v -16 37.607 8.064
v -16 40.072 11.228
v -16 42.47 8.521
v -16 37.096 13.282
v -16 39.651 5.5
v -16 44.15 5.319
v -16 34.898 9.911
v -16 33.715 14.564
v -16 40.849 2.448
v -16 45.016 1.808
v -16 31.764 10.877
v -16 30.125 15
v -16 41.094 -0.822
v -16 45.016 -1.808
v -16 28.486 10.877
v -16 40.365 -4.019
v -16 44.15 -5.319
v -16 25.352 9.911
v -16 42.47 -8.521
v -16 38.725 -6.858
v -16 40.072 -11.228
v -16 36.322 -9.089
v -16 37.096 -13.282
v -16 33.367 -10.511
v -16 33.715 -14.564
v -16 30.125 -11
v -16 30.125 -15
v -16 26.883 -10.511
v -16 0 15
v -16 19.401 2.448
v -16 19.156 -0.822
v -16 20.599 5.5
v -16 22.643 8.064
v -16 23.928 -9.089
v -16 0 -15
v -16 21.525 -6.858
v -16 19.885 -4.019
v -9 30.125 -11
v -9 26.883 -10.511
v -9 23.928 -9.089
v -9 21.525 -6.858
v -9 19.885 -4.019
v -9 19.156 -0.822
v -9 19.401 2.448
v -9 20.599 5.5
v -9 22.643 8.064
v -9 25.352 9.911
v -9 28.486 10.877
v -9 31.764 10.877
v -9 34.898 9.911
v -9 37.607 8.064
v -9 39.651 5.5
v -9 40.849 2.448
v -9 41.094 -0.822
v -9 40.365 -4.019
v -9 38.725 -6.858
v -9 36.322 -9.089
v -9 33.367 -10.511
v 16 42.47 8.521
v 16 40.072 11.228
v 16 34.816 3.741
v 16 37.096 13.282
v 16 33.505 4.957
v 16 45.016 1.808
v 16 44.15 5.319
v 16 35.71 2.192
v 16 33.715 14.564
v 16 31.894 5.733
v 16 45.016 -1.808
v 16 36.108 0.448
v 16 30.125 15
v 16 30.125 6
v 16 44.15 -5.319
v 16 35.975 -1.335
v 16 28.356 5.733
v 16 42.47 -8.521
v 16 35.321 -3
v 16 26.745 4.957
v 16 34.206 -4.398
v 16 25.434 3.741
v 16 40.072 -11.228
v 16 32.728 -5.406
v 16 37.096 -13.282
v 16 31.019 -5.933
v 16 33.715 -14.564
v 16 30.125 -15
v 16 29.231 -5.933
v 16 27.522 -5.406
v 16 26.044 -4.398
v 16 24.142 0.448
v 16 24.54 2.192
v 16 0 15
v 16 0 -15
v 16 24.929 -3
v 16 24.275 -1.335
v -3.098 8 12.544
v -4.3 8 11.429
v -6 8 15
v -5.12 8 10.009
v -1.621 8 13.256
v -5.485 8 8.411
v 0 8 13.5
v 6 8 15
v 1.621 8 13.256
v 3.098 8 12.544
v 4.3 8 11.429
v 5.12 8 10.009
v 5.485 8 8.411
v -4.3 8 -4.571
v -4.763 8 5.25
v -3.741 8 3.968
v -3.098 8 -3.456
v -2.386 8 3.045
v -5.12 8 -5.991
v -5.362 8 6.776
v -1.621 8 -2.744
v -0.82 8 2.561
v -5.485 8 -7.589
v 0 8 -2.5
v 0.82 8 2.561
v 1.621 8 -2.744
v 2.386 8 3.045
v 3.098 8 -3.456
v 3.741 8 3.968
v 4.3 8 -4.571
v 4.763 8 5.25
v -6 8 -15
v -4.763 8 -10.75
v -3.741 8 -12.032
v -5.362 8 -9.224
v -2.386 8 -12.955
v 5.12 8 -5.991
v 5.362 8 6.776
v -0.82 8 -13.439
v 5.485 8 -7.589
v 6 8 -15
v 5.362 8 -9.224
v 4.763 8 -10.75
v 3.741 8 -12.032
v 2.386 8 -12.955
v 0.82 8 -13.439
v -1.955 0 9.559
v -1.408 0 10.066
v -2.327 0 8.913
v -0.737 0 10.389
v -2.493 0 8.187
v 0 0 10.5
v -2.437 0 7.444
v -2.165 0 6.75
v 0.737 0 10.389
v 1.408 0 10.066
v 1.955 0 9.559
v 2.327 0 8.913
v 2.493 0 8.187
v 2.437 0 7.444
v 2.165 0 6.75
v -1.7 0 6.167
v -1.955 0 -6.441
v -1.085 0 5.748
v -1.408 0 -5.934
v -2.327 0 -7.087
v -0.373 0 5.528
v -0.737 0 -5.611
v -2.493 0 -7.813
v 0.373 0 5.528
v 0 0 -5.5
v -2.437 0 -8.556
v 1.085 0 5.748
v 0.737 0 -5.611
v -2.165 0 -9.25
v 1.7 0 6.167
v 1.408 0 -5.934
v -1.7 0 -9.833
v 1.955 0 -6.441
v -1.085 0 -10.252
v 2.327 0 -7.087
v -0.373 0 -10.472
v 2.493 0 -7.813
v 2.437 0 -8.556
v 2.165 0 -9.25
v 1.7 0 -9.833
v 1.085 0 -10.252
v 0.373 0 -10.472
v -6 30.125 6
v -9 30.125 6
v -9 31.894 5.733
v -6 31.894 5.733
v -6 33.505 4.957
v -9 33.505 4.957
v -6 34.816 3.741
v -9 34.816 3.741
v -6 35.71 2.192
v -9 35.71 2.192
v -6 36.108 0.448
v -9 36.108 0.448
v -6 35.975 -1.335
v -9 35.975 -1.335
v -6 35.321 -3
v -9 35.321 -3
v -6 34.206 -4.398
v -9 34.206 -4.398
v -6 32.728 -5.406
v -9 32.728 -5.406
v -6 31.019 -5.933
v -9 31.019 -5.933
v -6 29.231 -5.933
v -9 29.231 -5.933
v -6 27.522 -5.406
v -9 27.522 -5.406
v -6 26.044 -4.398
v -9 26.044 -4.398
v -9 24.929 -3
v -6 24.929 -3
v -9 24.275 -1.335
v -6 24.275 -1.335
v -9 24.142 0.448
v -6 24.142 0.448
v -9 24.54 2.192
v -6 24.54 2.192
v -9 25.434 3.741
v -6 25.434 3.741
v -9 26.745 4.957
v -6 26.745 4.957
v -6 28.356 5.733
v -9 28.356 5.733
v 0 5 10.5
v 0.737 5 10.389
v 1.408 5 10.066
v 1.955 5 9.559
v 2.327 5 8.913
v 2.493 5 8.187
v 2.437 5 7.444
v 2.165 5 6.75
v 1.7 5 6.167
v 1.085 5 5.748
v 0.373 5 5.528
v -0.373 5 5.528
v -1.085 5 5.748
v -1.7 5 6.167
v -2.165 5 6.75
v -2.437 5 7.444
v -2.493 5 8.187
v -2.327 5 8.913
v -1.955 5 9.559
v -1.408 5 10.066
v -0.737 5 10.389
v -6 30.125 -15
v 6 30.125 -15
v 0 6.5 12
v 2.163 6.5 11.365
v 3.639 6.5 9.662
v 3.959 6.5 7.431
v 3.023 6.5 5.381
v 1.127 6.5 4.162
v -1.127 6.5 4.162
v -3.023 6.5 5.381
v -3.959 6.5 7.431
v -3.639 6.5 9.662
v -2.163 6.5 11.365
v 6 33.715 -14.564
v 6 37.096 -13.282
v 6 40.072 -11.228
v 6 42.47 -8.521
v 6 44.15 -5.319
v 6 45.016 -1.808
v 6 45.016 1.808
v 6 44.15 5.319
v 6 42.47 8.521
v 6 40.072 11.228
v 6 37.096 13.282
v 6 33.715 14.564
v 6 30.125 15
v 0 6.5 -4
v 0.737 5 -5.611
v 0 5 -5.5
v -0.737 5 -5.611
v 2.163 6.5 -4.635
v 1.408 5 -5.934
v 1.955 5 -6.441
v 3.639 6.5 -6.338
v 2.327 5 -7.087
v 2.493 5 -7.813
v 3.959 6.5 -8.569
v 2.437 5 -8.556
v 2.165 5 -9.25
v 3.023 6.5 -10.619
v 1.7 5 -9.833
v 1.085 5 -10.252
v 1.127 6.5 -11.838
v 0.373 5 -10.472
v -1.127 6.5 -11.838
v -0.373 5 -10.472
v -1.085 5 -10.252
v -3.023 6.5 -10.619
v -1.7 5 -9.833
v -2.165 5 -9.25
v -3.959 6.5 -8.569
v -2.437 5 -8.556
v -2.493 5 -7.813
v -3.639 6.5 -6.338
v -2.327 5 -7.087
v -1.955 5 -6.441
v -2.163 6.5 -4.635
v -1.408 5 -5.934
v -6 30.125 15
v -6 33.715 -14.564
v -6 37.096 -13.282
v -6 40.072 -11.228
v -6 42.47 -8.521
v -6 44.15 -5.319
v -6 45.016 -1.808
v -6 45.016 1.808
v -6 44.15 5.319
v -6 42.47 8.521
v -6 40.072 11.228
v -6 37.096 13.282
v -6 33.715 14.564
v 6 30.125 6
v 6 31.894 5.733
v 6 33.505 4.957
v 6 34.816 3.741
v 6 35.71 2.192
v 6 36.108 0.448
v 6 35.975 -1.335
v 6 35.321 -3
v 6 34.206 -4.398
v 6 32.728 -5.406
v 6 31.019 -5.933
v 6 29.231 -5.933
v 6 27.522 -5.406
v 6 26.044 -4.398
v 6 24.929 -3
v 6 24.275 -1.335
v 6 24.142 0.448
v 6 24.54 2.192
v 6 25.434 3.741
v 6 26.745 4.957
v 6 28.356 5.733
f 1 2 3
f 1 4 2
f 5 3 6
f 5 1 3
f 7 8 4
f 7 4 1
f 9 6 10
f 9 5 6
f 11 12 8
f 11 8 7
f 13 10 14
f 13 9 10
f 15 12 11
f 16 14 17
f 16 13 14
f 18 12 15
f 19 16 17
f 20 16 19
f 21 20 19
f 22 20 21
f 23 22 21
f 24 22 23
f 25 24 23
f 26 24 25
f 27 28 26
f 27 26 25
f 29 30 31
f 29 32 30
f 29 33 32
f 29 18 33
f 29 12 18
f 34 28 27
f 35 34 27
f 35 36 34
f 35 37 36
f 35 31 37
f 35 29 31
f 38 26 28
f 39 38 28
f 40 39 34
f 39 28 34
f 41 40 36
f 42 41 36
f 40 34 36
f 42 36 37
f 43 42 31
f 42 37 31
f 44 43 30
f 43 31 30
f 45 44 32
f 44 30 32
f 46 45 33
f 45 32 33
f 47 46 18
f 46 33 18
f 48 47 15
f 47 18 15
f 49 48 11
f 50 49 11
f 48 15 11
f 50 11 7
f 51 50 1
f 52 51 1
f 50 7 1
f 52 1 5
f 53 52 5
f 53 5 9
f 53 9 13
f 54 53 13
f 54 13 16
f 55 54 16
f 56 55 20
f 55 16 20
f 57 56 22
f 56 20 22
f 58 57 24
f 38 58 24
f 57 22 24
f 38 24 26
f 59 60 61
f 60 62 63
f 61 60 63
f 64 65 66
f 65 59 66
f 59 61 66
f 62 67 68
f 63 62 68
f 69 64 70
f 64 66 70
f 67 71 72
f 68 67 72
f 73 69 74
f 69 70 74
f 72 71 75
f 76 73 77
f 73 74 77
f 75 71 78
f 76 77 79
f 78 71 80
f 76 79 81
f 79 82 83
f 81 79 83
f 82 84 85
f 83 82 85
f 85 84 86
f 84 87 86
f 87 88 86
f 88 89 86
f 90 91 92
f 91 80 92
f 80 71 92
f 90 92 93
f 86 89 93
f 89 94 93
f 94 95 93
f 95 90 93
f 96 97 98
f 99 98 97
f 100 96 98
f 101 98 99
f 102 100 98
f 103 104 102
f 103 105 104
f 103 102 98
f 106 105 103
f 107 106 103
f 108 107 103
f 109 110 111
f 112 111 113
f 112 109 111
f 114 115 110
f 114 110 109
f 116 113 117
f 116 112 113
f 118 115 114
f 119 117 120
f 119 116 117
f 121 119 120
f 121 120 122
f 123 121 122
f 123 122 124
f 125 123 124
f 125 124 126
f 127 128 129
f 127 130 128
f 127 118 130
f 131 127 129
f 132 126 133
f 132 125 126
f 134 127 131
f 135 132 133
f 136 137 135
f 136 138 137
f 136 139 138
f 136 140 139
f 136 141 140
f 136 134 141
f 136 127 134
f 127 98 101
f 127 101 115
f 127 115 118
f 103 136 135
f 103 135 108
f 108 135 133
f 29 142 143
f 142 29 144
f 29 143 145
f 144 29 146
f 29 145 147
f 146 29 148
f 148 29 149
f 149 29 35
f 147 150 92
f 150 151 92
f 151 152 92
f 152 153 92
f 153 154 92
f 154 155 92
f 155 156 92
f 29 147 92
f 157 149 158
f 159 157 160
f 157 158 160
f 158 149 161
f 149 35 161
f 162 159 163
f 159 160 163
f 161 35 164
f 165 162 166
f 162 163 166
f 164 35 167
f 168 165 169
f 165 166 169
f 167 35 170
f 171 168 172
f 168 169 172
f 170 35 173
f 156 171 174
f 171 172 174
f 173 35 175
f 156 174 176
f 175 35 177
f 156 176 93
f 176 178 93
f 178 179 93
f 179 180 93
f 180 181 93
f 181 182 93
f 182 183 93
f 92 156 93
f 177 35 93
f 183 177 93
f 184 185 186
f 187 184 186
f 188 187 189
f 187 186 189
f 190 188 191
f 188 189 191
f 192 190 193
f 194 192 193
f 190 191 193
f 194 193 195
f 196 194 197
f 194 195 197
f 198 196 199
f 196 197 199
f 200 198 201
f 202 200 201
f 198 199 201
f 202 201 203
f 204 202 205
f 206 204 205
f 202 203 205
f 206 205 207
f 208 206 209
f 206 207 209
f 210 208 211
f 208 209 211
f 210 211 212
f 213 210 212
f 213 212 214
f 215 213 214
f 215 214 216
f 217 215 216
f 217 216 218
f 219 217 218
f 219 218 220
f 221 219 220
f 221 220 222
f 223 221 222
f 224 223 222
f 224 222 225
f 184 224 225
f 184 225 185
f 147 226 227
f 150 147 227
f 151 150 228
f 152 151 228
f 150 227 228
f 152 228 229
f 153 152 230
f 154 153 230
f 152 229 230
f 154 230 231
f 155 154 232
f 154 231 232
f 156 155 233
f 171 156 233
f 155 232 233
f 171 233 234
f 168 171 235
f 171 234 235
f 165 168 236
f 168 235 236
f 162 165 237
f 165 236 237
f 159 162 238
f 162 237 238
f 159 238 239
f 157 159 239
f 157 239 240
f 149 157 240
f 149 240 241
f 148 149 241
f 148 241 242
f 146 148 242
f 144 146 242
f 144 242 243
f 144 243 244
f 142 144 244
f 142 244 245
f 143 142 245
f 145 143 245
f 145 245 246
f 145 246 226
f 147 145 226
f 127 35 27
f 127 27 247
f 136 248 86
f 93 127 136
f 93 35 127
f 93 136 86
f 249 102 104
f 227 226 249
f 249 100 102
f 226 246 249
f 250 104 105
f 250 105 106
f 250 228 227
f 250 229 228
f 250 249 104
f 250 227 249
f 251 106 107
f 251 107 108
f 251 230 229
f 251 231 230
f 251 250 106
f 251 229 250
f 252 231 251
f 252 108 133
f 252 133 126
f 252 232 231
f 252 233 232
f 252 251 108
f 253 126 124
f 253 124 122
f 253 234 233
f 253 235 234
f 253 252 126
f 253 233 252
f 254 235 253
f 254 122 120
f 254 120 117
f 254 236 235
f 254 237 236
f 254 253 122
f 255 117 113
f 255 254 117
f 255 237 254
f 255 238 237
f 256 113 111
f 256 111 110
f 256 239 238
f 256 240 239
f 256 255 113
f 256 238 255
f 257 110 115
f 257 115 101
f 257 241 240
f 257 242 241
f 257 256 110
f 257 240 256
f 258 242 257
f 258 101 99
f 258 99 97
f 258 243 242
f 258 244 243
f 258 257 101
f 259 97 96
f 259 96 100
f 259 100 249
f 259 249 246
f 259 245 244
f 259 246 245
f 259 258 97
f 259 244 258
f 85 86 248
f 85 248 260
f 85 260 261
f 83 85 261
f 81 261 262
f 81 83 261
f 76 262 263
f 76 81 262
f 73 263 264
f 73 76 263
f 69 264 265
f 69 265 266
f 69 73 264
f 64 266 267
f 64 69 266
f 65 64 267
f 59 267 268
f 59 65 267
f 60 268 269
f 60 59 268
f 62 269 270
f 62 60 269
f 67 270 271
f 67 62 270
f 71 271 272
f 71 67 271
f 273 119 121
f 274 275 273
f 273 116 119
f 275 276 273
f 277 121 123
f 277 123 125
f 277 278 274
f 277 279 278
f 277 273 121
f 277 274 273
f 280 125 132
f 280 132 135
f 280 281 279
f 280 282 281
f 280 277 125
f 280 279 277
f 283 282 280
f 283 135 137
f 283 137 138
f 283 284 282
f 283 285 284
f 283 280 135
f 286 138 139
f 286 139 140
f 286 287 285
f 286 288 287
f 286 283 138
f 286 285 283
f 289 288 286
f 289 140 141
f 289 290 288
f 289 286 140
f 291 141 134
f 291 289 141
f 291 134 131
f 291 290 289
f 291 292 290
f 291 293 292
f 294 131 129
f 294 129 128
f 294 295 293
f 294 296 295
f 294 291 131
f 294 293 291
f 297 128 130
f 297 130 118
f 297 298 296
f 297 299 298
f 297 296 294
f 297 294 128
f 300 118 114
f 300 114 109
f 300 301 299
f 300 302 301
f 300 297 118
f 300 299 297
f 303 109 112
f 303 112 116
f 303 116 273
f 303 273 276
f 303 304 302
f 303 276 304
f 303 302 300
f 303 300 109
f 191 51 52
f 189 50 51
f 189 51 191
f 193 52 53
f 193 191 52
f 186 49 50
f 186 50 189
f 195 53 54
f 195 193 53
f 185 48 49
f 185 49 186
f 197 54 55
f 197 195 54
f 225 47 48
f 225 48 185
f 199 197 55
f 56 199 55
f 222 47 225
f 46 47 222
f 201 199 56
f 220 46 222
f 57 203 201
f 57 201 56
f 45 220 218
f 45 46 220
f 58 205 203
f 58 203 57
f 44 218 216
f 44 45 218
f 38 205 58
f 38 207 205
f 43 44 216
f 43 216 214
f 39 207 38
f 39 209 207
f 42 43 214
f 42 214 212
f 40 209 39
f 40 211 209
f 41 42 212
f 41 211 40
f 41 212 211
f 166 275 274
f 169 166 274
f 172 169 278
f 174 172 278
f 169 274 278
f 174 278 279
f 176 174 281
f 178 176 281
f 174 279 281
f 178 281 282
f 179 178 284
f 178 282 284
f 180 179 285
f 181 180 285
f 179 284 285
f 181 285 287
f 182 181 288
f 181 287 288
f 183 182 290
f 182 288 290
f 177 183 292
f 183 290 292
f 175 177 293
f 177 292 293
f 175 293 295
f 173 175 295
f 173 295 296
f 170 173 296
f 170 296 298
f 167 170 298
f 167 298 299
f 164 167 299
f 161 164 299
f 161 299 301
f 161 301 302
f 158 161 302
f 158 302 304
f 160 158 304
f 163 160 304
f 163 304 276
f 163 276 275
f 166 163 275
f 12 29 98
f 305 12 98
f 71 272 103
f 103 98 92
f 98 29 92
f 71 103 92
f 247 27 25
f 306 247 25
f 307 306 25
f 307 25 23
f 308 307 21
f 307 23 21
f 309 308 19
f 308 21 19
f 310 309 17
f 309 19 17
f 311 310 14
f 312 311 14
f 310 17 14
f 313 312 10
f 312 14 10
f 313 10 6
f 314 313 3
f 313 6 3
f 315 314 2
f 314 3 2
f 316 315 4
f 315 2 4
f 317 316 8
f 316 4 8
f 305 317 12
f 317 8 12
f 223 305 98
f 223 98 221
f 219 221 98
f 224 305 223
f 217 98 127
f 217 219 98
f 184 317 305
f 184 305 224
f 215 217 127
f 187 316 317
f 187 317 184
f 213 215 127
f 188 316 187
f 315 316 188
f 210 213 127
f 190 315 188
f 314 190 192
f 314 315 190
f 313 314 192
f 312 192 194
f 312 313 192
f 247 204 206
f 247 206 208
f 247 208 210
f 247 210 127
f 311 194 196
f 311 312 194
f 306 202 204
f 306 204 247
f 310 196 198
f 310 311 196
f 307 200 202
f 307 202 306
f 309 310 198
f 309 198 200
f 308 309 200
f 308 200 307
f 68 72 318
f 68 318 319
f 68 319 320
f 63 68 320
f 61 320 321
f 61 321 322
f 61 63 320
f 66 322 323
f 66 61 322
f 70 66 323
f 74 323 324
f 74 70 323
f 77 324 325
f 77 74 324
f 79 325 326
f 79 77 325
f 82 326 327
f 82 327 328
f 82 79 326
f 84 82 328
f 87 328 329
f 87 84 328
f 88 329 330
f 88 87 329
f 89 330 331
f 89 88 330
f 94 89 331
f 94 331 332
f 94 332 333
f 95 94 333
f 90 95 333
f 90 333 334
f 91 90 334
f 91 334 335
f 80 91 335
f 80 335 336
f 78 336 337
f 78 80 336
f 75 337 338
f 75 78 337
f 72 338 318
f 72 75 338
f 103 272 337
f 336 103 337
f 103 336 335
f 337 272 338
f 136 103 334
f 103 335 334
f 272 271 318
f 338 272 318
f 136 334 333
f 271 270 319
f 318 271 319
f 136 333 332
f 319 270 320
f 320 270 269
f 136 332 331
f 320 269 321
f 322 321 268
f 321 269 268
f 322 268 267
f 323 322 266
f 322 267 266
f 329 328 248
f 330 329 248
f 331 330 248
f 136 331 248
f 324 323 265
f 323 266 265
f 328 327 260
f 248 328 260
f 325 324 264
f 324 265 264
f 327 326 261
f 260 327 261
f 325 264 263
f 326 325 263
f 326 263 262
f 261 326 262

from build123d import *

# Parameters (mm, degrees)
SKETCH_1_W          = 32
SKETCH_1_H          = 30
EXTRUDE_1_DEPTH     = 8
SKETCH_2_R          = 6
EXTRUDE_2_DEPTH     = 10
CUT_EXTRUDE_START   = 10
SKETCH_4_R          = 11
CUT_EXTRUDE_1_DEPTH = 7
SKETCH_5_R          = 2.5
CUT_EXTRUDE_2_DEPTH = 44.119202509
CHAMFER_1_SIZE      = 3


with BuildPart() as part:
    # 草图1 → 凸台-拉伸1 (new body)
    with BuildSketch(Plane(origin=(0, 0, 0), x_dir=(1, 0, 0), z_dir=(0, 1, 0))):
        Rectangle(SKETCH_1_W, SKETCH_1_H)
    extrude(amount=EXTRUDE_1_DEPTH)

    # 草图2 → 凸台-拉伸2 (add)
    with BuildSketch(Plane.ZY.offset(16)):
        with BuildLine():
            Line((15, 0), (-15, 0))
            Line((-15, 0), (-15, 30.125))
            ThreePointArc((-15, 30.125), (0, 45.125), (15, 30.125))
            Line((15, 30.125), (15, 0))
        make_face()
        with Locations((0, 30.125)):
            Circle(SKETCH_2_R, mode=Mode.SUBTRACT)
    extrude_2 = extrude(amount=-EXTRUDE_2_DEPTH)

    # 草图4 → 切除-拉伸1 (cut)
    with BuildSketch(Plane.ZY.offset(6).offset(CUT_EXTRUDE_START)):
        with Locations(Location((0, 30.125, 0), (0, 0, 180))):
            Circle(SKETCH_4_R)
    extrude(amount=-CUT_EXTRUDE_1_DEPTH, mode=Mode.SUBTRACT)

    # 镜向1: 凸台-拉伸2 across plane
    add(extrude_2.mirror(Plane(origin=(0, 0, 0), x_dir=(0, 0, 1), z_dir=(1, 0, 0))))

    # 草图5 → 切除-拉伸2 (cut, through all)
    with BuildSketch(Plane(origin=(0, 8, 0), x_dir=(1, 0, 0), z_dir=(0, 1, 0))):
        with Locations(Location((0, 8, 0), (0, 0, 270))):
            Circle(SKETCH_5_R)
        with Locations(Location((0, -8, 0), (0, 0, 270))):
            Circle(SKETCH_5_R)
    extrude(amount=-CUT_EXTRUDE_2_DEPTH, mode=Mode.SUBTRACT)

    # 倒角1
    chamfer_1_edges = [part.edges().sort_by_distance(p)[0] for p in [
        (0, 8, -10.5),
        (0, 8, 5.5),
    ]]
    chamfer(chamfer_1_edges, length=CHAMFER_1_SIZE)


solid = part.part
